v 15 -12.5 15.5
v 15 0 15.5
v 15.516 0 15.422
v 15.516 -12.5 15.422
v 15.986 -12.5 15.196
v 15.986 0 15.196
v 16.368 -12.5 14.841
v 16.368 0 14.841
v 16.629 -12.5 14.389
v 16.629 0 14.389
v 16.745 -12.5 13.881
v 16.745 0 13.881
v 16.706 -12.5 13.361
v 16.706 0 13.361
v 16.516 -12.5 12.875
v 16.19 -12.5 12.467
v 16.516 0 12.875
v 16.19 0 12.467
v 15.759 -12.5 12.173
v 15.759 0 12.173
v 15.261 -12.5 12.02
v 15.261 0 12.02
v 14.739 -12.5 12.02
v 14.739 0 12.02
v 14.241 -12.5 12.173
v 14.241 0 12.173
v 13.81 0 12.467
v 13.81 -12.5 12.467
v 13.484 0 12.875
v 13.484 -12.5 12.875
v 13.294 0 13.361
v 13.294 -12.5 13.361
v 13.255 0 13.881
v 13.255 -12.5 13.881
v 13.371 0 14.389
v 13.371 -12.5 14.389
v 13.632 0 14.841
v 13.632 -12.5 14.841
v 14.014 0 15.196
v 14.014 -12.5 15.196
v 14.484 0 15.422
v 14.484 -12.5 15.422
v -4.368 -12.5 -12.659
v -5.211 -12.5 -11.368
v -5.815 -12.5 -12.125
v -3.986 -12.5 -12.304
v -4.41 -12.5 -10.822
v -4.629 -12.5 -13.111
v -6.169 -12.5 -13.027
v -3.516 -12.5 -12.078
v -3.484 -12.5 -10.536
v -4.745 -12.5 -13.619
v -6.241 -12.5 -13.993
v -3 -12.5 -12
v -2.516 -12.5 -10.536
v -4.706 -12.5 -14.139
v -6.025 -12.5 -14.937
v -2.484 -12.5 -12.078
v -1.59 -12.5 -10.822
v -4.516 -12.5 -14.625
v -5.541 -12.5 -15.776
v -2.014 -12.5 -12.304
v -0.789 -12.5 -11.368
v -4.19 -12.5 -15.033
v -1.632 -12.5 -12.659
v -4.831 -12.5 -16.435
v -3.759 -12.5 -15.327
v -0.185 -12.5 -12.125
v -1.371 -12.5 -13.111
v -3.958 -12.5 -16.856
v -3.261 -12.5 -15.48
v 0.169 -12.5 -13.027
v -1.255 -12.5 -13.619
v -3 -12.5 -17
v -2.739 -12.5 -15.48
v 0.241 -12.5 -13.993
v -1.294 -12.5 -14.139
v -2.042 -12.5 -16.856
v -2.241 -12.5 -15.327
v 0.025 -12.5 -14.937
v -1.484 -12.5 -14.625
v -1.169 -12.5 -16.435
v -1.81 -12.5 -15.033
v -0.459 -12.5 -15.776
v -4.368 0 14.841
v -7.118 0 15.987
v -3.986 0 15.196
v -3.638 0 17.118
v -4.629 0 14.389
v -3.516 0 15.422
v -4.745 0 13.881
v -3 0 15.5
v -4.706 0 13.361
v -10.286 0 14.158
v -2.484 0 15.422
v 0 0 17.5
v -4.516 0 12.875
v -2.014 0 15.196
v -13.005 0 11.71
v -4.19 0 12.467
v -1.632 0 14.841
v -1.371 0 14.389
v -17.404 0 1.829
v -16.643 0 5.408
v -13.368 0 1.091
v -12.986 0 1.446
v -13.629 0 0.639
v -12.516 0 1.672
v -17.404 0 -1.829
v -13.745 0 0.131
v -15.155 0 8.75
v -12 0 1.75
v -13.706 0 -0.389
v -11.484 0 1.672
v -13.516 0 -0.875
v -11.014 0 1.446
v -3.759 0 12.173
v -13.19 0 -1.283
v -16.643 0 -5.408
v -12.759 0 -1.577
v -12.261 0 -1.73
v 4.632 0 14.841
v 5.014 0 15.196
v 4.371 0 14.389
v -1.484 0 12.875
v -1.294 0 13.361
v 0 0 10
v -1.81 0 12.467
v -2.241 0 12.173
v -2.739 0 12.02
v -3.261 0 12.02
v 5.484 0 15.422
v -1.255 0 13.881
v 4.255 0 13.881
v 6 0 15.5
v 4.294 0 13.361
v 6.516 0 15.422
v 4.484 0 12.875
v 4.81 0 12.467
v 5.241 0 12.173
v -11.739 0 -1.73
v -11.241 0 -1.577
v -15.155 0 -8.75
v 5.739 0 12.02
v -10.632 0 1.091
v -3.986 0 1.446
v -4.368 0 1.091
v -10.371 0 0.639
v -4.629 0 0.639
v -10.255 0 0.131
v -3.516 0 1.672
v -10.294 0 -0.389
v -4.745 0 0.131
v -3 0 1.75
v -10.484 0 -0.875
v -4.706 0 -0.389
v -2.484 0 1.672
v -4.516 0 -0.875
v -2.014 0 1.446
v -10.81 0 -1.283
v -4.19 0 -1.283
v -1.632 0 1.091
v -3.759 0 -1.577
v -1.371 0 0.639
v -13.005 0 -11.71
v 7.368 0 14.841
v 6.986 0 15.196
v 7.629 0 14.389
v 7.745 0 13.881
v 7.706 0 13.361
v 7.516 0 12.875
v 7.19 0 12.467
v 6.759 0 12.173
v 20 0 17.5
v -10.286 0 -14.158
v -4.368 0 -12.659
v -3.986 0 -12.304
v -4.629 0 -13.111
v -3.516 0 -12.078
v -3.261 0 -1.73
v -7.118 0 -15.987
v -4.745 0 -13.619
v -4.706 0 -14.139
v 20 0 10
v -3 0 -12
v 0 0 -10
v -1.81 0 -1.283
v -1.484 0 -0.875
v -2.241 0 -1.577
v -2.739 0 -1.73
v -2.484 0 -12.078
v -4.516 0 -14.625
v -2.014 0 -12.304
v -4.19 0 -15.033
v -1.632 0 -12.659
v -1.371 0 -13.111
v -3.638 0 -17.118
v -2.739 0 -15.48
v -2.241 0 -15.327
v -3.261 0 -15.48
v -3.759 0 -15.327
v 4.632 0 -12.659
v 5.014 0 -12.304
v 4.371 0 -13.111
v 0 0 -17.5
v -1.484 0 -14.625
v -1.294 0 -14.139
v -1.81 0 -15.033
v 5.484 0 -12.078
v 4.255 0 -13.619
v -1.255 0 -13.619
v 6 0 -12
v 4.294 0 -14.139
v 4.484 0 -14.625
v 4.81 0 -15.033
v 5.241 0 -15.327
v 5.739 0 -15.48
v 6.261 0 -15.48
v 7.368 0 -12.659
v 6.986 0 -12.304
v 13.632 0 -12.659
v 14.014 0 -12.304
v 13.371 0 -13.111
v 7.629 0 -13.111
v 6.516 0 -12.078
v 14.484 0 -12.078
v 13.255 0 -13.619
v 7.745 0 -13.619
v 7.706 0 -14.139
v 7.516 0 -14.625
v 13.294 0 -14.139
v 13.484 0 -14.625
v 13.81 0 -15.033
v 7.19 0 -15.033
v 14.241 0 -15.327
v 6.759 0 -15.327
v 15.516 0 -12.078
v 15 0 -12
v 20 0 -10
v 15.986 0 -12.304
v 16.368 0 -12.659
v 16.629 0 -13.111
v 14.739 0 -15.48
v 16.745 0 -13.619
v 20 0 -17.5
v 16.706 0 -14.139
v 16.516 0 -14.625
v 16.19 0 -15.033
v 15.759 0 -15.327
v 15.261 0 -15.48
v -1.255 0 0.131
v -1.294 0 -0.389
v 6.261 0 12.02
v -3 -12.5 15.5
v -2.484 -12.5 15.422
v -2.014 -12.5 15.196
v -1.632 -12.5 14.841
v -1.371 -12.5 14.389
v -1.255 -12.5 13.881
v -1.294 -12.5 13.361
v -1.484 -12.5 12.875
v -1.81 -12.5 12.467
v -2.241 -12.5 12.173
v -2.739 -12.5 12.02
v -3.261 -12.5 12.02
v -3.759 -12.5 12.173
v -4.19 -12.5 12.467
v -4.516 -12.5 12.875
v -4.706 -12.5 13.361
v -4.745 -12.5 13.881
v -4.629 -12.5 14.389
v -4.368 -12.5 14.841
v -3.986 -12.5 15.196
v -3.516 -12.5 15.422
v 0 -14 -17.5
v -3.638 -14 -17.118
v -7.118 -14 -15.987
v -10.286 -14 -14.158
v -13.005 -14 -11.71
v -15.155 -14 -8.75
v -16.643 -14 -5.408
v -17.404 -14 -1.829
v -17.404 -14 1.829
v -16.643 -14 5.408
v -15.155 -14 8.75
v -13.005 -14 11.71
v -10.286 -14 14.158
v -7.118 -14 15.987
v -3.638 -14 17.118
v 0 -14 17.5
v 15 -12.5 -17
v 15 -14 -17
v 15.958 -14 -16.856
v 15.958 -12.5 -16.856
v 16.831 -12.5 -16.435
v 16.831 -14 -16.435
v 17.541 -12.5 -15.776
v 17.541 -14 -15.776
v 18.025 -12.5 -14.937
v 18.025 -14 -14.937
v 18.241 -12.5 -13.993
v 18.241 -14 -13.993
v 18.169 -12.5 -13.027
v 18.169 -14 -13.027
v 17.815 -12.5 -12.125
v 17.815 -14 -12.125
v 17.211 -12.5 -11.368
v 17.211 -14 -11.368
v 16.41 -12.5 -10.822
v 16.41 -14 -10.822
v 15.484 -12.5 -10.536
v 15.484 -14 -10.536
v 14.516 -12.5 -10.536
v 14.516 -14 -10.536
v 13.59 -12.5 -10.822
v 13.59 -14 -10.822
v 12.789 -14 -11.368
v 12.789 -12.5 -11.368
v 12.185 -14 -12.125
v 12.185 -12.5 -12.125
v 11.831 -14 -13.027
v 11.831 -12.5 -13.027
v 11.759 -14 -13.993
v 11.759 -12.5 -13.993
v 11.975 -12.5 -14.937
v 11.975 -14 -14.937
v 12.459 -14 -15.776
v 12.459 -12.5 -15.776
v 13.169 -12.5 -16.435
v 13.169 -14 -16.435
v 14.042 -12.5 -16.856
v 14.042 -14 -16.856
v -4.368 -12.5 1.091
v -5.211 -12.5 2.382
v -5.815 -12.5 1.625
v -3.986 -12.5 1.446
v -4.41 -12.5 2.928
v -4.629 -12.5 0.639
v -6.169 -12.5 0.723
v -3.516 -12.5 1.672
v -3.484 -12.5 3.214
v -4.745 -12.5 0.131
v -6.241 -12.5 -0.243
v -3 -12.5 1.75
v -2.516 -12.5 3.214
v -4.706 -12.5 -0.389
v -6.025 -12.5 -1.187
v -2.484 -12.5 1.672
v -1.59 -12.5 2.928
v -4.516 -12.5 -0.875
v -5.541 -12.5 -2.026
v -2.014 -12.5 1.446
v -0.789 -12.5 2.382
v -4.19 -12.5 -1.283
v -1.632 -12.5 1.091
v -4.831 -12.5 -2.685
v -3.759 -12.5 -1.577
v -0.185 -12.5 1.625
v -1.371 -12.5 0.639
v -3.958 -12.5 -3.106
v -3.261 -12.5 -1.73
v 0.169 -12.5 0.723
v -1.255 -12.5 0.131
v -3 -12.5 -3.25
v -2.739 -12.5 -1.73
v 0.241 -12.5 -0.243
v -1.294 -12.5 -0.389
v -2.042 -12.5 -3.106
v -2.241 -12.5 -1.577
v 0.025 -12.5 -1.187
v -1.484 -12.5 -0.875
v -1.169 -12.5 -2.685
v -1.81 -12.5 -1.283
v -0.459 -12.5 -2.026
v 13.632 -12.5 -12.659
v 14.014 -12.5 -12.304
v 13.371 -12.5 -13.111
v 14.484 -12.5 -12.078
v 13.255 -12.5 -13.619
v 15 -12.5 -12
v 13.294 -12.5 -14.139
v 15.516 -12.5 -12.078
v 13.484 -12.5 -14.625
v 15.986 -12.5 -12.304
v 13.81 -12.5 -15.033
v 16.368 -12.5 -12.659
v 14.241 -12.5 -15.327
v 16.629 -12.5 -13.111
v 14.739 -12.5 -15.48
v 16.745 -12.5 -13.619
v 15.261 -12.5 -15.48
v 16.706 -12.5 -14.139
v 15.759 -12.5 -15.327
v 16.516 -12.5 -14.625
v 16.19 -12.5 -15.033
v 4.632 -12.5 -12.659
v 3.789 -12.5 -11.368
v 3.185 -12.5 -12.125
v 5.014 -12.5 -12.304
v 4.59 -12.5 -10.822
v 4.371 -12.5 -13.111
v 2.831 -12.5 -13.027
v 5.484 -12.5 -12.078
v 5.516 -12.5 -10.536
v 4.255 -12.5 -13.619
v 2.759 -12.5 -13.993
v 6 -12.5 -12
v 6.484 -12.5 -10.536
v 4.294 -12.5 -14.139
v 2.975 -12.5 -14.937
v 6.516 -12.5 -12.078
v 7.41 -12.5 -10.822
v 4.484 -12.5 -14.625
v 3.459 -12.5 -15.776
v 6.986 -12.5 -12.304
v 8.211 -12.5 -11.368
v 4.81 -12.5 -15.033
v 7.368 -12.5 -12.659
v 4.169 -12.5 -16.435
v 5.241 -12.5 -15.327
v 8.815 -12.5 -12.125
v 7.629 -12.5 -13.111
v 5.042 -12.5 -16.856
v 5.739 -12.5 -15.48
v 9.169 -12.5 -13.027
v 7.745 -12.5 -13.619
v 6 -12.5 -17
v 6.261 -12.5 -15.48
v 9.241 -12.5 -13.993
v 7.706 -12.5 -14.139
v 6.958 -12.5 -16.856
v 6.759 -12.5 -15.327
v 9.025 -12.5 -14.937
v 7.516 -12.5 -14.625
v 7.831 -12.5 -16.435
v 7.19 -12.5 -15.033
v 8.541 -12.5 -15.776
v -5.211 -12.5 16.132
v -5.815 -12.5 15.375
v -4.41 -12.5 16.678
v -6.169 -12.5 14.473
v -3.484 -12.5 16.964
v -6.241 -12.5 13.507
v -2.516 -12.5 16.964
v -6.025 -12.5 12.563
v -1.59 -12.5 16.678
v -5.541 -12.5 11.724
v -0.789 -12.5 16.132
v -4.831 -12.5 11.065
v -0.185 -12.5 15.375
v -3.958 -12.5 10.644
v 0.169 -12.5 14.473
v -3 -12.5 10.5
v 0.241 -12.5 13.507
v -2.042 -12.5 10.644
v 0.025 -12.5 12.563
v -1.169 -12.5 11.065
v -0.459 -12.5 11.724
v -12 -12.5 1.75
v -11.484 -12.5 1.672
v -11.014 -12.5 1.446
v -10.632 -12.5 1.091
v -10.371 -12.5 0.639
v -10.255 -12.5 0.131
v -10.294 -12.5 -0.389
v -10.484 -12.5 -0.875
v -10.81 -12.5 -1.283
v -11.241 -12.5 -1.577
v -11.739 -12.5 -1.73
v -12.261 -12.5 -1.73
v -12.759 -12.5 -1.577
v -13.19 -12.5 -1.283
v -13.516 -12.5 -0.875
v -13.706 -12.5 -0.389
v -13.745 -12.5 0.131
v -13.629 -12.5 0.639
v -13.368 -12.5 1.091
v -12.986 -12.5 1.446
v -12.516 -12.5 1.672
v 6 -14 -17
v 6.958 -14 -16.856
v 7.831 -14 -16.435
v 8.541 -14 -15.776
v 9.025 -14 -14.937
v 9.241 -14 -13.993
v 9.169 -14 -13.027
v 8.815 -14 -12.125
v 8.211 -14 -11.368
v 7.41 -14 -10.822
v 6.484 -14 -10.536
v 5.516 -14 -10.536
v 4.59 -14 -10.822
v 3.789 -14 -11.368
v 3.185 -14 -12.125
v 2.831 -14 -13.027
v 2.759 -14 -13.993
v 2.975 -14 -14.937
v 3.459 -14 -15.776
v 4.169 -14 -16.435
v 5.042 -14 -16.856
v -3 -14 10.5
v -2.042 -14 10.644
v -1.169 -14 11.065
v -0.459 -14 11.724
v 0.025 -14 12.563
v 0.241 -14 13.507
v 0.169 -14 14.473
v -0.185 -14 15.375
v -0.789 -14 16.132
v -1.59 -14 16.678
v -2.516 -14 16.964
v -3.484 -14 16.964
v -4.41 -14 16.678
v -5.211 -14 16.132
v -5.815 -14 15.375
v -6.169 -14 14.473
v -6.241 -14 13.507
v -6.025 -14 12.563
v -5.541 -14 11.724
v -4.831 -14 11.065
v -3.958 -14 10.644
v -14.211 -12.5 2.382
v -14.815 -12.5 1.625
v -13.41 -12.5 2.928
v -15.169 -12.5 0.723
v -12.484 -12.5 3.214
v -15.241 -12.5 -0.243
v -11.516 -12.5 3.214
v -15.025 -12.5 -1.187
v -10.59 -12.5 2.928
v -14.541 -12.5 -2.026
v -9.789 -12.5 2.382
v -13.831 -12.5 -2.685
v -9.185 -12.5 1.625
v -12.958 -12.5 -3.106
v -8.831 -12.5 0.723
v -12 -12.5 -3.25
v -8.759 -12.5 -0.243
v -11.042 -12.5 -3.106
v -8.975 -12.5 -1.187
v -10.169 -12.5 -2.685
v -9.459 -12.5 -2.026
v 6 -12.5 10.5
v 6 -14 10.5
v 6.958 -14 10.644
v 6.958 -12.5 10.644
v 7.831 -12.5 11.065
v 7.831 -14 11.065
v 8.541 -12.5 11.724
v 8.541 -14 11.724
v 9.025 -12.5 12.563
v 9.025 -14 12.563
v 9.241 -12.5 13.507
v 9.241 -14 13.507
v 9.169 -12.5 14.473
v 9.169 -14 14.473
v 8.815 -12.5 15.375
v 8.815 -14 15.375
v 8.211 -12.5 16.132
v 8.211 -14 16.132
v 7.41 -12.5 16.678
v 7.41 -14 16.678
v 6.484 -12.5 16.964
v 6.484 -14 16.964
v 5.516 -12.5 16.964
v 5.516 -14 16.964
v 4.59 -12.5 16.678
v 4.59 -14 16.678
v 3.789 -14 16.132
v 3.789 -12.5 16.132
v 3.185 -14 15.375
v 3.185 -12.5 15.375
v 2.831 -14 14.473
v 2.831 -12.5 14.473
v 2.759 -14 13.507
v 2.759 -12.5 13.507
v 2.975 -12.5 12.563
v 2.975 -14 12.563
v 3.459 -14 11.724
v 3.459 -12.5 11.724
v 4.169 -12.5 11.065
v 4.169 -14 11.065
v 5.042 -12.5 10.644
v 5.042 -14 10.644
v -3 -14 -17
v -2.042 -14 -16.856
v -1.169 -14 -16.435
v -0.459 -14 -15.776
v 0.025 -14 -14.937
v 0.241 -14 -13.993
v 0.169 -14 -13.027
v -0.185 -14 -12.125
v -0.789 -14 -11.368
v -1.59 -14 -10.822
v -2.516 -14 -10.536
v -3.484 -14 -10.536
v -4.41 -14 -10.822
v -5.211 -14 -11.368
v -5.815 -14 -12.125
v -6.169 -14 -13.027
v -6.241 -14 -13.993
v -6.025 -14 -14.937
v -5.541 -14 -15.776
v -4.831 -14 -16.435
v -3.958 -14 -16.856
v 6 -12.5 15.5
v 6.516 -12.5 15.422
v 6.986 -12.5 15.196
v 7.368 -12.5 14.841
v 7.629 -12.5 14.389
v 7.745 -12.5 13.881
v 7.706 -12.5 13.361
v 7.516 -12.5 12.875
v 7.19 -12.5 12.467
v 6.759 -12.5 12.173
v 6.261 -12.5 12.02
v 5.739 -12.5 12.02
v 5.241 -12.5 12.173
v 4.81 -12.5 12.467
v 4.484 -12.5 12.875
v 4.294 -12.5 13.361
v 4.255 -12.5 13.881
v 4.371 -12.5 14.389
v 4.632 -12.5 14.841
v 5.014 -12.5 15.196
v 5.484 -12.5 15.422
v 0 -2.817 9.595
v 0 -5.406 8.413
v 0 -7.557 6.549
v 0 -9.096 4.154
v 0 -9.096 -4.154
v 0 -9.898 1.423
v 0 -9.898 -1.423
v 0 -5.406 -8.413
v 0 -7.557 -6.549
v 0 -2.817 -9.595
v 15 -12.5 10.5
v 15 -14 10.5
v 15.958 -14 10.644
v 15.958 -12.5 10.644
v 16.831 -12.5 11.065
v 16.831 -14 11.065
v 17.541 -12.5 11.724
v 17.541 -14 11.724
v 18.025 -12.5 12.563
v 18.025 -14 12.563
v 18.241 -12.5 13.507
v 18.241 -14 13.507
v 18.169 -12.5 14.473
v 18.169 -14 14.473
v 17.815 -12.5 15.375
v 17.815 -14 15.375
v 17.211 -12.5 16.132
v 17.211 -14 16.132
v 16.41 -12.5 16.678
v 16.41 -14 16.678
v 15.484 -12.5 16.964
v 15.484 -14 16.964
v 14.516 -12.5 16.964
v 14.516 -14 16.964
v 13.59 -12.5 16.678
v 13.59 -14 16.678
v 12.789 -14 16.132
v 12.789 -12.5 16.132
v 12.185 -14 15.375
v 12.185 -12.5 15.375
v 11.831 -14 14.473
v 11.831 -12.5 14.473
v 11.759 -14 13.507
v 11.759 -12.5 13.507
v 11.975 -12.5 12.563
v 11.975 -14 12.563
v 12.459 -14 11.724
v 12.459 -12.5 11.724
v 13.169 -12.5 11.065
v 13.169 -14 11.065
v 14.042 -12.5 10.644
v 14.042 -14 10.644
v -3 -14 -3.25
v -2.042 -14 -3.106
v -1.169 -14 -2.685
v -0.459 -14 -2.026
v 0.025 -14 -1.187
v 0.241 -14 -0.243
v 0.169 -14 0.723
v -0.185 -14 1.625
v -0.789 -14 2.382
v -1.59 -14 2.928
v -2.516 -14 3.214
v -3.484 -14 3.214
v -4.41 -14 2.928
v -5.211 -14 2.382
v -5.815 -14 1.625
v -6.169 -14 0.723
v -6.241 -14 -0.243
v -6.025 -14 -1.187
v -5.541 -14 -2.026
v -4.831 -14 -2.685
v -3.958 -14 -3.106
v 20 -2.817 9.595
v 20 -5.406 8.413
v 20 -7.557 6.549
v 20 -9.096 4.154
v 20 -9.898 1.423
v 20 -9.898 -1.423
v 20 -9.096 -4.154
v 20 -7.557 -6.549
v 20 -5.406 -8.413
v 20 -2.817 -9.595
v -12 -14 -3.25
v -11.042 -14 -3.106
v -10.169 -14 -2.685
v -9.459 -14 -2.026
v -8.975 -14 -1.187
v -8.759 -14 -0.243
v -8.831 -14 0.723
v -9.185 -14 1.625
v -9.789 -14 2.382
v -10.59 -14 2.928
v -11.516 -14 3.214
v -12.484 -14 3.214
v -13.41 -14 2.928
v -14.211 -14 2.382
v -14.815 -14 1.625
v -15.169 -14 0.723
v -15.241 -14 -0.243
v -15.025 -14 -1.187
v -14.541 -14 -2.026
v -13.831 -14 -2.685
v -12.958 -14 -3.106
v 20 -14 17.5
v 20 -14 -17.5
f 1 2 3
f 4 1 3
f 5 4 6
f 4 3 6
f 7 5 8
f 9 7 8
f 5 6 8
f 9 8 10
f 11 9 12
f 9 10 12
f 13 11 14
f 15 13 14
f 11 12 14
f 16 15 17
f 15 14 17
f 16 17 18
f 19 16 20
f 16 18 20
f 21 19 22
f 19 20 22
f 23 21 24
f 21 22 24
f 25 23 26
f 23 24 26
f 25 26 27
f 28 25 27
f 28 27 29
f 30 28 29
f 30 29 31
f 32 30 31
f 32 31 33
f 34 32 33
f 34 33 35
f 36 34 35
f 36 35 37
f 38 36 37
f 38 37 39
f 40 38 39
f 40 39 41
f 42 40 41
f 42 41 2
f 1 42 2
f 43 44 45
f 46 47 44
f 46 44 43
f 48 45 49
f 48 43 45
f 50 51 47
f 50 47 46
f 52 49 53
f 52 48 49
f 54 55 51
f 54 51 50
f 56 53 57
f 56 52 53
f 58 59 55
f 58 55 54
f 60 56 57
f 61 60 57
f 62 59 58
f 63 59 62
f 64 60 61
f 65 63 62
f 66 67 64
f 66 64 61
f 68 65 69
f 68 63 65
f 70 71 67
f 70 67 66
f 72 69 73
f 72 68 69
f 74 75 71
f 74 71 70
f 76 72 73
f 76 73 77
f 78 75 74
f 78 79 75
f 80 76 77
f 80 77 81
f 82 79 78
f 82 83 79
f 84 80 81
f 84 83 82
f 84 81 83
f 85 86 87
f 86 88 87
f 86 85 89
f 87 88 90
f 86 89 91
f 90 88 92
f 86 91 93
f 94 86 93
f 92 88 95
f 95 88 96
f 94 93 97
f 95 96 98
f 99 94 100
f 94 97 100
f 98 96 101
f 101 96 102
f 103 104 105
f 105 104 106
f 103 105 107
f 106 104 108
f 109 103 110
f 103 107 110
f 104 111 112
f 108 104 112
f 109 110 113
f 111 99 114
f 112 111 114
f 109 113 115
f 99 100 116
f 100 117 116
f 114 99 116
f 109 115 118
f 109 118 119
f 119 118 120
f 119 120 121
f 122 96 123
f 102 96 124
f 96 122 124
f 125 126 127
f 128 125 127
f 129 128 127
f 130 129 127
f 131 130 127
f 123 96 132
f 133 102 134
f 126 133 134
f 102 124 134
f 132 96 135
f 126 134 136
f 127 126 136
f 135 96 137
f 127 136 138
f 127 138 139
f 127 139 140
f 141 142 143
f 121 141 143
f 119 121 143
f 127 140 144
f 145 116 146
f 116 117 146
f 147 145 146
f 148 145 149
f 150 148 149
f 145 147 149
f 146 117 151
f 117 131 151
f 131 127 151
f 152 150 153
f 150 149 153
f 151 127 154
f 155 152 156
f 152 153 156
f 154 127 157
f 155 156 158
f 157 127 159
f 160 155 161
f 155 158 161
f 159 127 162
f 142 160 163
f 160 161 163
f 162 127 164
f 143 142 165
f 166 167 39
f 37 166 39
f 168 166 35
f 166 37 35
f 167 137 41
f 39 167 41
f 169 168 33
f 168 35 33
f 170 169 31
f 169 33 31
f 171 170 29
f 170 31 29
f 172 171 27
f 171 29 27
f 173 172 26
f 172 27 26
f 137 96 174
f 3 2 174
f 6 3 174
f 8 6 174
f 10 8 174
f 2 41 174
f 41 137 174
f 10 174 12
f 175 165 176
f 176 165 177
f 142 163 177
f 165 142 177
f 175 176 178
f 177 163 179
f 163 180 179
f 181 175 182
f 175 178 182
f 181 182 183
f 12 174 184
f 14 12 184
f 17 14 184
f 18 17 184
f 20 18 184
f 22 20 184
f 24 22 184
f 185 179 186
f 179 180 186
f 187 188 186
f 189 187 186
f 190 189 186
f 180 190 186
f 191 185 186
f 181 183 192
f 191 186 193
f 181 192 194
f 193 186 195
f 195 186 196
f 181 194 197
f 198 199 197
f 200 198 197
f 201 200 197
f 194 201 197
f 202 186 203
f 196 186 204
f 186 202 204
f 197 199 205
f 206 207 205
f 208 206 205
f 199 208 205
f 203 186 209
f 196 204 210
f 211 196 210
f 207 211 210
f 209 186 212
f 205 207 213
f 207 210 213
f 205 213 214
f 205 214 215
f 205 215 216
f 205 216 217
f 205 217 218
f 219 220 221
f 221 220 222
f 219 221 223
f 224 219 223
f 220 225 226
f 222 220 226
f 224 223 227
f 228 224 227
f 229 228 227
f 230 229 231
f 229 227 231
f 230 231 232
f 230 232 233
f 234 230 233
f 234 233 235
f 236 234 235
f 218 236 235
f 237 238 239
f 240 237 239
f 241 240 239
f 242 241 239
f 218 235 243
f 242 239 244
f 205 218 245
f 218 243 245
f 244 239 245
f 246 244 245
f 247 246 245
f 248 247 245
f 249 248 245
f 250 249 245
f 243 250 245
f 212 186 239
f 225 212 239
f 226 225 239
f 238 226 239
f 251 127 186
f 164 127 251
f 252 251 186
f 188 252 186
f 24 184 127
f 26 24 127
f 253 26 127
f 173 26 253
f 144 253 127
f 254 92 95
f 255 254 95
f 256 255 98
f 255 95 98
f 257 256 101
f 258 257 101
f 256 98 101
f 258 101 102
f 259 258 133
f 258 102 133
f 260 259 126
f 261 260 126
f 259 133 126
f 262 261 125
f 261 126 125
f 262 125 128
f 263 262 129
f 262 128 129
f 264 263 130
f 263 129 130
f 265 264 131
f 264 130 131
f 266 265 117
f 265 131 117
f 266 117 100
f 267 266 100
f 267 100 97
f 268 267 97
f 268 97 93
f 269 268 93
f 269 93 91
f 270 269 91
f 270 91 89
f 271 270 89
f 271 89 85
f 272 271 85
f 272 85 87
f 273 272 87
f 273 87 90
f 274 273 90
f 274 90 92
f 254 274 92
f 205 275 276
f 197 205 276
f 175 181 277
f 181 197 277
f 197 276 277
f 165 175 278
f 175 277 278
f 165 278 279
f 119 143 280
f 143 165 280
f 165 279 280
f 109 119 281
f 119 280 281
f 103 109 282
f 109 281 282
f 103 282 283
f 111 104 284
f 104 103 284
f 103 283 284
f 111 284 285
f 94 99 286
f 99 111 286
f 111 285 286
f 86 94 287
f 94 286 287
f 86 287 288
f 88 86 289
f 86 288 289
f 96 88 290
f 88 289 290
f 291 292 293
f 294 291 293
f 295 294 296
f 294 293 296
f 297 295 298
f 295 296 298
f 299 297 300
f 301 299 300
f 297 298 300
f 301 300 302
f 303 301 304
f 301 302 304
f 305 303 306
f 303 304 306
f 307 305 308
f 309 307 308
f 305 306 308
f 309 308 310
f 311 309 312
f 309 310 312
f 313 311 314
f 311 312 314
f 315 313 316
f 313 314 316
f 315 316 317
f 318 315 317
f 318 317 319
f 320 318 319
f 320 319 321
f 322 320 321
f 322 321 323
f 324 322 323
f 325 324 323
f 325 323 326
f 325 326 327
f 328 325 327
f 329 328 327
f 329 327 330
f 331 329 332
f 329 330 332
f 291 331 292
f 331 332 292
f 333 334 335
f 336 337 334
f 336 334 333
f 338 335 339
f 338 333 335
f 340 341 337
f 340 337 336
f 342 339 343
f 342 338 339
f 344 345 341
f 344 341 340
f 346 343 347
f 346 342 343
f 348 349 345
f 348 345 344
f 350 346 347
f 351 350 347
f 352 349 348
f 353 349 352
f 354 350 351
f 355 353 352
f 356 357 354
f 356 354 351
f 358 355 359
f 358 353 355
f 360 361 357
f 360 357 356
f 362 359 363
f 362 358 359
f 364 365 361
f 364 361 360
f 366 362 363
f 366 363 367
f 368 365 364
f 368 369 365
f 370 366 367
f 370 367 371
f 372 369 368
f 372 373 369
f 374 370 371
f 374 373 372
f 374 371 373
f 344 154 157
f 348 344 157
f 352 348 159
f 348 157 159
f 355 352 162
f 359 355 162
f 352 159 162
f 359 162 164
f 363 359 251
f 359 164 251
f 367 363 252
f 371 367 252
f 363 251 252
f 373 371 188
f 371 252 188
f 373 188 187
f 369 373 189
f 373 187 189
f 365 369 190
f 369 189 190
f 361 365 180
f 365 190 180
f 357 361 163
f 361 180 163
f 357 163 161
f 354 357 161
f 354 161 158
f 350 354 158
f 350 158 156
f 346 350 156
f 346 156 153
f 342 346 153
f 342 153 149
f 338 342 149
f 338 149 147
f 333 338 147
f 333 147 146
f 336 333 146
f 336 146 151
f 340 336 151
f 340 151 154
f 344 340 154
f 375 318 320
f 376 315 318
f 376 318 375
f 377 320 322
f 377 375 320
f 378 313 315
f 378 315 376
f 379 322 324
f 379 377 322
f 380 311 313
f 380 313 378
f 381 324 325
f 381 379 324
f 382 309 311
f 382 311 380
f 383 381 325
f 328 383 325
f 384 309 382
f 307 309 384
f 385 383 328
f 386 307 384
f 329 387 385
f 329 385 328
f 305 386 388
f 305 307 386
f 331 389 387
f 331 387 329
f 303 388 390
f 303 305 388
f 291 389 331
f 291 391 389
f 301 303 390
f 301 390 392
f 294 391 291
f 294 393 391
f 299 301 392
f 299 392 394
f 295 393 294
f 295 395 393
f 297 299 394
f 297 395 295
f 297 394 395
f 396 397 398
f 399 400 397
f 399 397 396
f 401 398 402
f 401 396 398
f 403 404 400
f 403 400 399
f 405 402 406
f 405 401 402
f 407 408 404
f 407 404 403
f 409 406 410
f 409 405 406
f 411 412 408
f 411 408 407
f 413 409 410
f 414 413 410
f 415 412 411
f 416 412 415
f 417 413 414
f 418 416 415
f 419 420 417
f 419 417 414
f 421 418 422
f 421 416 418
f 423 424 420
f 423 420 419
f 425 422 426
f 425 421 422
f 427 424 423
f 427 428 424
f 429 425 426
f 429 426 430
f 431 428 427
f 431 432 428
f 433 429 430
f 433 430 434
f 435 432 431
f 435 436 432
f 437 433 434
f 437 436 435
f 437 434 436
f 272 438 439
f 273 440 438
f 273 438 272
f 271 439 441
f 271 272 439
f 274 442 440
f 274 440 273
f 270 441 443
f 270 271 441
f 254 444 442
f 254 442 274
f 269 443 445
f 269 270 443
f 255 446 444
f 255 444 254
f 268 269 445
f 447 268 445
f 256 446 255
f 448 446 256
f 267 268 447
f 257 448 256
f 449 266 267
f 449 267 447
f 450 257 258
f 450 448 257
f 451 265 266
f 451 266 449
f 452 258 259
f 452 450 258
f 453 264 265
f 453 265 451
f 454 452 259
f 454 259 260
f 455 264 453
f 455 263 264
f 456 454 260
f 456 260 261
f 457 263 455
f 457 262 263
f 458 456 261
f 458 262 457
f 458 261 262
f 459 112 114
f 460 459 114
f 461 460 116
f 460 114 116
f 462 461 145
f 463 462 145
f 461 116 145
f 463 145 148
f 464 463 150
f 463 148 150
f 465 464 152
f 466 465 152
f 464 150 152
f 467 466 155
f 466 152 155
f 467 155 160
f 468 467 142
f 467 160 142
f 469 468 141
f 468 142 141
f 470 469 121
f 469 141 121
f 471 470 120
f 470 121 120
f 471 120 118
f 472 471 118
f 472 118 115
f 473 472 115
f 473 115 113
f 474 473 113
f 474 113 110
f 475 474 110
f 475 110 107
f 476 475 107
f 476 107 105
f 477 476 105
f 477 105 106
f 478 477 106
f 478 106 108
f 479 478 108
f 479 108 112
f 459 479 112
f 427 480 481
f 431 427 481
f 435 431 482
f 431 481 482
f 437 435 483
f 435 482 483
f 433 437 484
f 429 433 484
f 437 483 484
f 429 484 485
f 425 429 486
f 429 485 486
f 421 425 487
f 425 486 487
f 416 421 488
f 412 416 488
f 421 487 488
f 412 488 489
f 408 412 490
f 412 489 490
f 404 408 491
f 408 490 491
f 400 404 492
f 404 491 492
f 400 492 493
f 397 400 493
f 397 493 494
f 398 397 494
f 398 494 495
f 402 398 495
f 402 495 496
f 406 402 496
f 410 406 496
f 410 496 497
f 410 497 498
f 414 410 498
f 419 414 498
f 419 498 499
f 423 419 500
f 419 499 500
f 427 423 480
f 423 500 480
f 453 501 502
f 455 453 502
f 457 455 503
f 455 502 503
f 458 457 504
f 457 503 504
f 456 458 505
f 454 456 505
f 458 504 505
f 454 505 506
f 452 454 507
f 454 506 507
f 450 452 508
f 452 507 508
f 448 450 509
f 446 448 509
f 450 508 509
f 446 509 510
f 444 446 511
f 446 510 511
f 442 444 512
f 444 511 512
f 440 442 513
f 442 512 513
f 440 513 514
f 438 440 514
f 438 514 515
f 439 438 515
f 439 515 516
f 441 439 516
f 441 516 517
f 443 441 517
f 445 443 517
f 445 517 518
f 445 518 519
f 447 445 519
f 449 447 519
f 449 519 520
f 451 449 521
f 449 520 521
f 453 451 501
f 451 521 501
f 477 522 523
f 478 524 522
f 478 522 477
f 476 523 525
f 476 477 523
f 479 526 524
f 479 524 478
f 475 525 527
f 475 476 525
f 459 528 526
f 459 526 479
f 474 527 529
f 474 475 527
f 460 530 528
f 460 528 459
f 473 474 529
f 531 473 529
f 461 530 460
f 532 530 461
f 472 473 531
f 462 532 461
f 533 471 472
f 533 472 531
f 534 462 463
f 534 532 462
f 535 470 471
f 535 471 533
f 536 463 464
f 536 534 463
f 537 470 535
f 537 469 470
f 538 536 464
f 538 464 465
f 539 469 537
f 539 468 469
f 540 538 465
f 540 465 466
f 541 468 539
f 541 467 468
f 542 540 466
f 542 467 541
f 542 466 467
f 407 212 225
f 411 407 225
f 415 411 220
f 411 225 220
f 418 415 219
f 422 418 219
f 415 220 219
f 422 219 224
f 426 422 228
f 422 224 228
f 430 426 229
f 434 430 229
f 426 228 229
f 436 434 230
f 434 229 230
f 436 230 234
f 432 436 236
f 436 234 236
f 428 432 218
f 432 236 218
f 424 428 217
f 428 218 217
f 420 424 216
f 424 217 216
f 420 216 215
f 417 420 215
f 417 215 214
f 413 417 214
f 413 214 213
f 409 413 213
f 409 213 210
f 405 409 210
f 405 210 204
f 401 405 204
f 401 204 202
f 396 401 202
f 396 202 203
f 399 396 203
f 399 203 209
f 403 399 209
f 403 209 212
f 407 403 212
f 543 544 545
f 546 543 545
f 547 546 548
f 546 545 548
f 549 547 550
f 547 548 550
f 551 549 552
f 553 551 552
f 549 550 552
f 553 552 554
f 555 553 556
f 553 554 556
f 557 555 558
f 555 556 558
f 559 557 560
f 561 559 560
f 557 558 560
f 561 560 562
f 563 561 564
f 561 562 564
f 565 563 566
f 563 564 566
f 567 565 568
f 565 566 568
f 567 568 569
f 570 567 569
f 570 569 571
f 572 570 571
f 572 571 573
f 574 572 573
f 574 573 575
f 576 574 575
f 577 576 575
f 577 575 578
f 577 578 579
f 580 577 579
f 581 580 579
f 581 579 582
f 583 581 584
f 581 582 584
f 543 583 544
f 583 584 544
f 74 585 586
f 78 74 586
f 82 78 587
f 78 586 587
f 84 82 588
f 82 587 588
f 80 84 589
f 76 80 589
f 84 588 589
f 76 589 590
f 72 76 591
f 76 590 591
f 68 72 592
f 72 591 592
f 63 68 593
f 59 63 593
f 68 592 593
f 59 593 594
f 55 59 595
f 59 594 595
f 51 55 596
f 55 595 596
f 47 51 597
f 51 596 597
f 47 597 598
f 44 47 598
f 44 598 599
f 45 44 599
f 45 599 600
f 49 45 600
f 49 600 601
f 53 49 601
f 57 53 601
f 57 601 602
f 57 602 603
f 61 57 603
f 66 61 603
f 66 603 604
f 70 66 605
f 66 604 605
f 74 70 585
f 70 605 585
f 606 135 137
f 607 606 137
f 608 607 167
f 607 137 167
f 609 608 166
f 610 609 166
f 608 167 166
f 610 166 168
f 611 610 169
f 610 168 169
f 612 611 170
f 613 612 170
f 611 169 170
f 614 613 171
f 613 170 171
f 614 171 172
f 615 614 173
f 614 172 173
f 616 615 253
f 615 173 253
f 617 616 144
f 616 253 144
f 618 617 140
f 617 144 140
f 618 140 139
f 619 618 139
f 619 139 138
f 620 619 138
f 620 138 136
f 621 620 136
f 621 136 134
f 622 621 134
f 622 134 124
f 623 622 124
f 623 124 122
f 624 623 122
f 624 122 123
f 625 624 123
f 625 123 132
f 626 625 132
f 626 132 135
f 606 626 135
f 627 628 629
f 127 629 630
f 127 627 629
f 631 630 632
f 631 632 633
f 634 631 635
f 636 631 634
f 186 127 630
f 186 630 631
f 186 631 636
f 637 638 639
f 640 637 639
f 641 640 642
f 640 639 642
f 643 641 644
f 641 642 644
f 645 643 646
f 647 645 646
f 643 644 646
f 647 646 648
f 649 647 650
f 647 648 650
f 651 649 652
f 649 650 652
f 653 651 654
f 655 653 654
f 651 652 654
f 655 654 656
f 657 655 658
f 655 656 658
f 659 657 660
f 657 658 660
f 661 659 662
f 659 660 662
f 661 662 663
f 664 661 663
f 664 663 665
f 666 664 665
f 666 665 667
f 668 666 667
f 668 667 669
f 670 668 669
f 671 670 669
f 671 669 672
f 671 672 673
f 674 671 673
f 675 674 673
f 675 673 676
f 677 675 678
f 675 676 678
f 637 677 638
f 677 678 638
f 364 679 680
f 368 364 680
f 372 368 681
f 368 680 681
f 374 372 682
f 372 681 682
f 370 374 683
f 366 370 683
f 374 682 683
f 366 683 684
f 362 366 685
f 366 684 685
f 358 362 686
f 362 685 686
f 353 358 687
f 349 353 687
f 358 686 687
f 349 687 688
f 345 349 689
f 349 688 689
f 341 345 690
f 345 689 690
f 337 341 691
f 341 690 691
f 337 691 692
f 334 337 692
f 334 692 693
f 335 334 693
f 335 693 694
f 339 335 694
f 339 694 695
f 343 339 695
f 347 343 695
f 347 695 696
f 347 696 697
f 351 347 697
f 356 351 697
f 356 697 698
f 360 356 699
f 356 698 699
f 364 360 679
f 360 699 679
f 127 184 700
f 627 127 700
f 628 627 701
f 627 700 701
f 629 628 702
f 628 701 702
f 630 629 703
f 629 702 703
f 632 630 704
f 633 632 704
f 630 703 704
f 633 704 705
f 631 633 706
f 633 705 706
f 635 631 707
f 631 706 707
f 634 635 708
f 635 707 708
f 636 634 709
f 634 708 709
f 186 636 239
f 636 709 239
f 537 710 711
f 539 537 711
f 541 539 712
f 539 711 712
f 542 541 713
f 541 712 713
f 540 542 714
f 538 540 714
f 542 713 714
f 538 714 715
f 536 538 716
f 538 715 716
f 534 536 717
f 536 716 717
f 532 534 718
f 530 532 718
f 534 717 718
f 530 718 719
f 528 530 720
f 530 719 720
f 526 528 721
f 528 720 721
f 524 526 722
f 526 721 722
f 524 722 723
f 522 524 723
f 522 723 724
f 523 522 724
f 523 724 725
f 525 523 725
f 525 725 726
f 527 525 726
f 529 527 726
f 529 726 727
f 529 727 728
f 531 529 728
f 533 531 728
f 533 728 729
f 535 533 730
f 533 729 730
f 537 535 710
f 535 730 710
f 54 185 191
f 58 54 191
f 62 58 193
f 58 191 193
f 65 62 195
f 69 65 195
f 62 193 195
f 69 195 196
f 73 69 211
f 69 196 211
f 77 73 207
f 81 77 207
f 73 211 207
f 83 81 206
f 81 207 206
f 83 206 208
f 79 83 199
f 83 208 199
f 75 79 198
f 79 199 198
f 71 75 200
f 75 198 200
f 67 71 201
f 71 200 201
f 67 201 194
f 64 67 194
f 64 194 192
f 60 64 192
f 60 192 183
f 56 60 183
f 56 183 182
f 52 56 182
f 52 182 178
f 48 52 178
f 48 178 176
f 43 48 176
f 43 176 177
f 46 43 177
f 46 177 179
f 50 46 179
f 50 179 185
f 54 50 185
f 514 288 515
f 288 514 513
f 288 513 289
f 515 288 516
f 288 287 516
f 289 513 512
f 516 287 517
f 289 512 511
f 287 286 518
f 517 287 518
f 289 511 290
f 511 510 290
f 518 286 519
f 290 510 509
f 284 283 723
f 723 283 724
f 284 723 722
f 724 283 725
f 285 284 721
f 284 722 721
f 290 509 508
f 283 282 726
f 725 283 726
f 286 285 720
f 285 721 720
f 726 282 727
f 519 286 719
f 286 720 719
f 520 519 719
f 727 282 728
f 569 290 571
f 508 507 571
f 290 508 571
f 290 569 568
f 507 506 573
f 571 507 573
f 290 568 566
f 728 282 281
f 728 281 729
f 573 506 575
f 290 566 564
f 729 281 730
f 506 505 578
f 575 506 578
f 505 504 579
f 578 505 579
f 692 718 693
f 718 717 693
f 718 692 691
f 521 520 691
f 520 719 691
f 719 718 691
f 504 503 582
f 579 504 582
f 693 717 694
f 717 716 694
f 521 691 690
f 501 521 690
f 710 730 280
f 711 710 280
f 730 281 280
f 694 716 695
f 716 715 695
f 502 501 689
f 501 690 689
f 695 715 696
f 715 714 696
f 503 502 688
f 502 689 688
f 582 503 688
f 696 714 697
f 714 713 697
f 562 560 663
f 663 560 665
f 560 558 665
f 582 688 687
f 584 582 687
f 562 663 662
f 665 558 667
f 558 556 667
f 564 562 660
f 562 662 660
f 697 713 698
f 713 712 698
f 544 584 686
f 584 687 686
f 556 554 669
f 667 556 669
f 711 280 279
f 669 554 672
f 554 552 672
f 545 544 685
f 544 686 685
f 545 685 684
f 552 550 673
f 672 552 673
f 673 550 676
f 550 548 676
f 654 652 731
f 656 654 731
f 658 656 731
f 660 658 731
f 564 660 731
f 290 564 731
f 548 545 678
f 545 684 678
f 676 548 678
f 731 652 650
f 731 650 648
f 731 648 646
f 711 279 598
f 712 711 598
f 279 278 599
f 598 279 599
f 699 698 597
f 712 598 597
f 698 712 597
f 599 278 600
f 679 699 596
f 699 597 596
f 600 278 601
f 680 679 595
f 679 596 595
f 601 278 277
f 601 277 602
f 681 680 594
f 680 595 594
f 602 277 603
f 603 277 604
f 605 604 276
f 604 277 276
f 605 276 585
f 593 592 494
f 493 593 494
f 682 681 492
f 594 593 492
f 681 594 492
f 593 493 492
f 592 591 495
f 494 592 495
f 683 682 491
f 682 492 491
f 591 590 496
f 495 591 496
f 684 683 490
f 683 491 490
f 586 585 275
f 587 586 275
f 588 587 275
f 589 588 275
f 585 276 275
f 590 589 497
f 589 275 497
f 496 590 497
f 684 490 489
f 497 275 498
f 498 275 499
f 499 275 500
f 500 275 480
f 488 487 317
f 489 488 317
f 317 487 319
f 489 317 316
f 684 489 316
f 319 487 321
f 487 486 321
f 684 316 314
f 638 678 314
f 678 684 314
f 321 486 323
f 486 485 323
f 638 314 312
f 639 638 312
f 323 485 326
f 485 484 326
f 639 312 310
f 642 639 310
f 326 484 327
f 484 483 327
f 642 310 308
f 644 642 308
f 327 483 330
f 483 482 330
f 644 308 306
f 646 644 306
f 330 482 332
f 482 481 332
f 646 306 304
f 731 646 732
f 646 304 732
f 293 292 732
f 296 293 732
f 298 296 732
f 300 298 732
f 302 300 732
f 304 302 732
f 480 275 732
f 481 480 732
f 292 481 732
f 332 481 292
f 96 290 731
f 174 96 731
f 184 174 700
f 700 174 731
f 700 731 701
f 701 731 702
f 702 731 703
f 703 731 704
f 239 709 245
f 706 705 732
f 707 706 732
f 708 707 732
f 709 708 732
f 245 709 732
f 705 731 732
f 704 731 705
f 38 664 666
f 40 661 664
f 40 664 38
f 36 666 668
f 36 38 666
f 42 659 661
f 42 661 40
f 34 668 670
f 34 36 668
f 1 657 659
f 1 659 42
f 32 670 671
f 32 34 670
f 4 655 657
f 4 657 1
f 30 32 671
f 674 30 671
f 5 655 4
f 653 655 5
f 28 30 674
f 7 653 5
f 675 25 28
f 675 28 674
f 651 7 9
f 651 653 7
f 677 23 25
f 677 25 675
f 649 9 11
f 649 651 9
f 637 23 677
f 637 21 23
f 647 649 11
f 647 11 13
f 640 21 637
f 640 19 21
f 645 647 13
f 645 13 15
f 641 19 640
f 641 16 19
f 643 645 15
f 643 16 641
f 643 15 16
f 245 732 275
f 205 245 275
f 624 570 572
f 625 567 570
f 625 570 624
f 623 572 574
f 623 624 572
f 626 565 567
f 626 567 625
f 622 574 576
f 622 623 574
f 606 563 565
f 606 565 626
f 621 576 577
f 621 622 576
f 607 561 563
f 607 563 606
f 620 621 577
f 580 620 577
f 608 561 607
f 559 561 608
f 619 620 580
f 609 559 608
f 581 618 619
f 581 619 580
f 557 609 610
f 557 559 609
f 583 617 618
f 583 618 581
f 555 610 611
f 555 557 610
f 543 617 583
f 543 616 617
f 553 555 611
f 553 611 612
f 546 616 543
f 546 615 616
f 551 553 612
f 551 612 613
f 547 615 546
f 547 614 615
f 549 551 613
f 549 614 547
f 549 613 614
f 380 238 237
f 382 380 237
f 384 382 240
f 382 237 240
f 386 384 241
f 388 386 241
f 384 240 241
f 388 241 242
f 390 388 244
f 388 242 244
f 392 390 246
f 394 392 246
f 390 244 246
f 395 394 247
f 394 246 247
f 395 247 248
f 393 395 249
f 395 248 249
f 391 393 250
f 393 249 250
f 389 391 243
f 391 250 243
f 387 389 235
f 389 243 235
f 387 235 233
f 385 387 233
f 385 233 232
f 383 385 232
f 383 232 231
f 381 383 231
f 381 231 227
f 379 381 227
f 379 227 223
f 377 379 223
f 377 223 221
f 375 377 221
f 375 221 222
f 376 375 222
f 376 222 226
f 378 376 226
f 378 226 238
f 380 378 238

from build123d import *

# Parameters (mm, degrees)
BOSS_EXTRUDE1_DEPTH      = 14
BOSS_EXTRUDE1_DEPTH_BACK = 14
SKETCH3_R                = 10
CUT_EXTRUDE1_DEPTH       = 20
CUT_EXTRUDE3_DEPTH       = 39
SKETCH5_R                = 1.75
CUT_EXTRUDE4_DEPTH       = 39
SKETCH6_R                = 3.25
CUT_EXTRUDE5_DEPTH       = 1.5


with BuildPart() as part:
    # Sketch1 → Boss-Extrude1 (new, two sides: drawn at the far end of the back side and taken through both)
    with BuildSketch(Plane(origin=(0, 0, 0), x_dir=(1, 0, 0), z_dir=(0, 1, 0)).offset(-BOSS_EXTRUDE1_DEPTH_BACK)):
        with BuildLine():
            Line((20, 17.5), (0, 17.5))
            ThreePointArc((0, 17.5), (-17.5, -1.3e-08), (2.7e-08, -17.5))
            Line((2.7e-08, -17.5), (20, -17.5))
            Line((20, -17.5), (20, 17.5))
        make_face()
    extrude(amount=BOSS_EXTRUDE1_DEPTH + BOSS_EXTRUDE1_DEPTH_BACK)

    # Sketch3 → Cut-Extrude1 (cut)
    with BuildSketch(Plane(origin=(20, 0, 0), x_dir=(0, 0, -1), z_dir=(1, 0, 0))):
        Circle(SKETCH3_R)
    extrude(amount=-CUT_EXTRUDE1_DEPTH, mode=Mode.SUBTRACT)

    # Sketch4 → Cut-Extrude3 (cut)
    with BuildSketch(Plane(origin=(20, 0, 0), x_dir=(0, 0, -1), z_dir=(1, 0, 0))):
        Polygon((-29.488337181, 0), (29.963955523, 0), (3.938373511, 60.173176489), align=None)
    extrude(amount=-CUT_EXTRUDE3_DEPTH, mode=Mode.SUBTRACT)

    # Sketch5 → Cut-Extrude4 (cut)
    with BuildSketch(Plane(origin=(0, 0, 0), x_dir=(1, 0, 0), z_dir=(0, 1, 0))):
        with Locations((15, 13.75)):
            Circle(SKETCH5_R)
        with Locations((6, 13.75)):
            Circle(SKETCH5_R)
        with Locations((-3, 13.75)):
            Circle(SKETCH5_R)
        with Locations((-3, 0)):
            Circle(SKETCH5_R)
        with Locations((-12, 0)):
            Circle(SKETCH5_R)
        with Locations((15, -13.75)):
            Circle(SKETCH5_R)
        with Locations((6, -13.75)):
            Circle(SKETCH5_R)
        with Locations((-3, -13.75)):
            Circle(SKETCH5_R)
    extrude(amount=-CUT_EXTRUDE4_DEPTH, mode=Mode.SUBTRACT)

    # Sketch6 → Cut-Extrude5 (cut)
    with BuildSketch(Plane.XZ.offset(14)):
        with Locations((-3, 13.75)):
            Circle(SKETCH6_R)
        with Locations((6, 13.75)):
            Circle(SKETCH6_R)
        with Locations((15, 13.75)):
            Circle(SKETCH6_R)
        with Locations((-12, 0)):
            Circle(SKETCH6_R)
        with Locations((-3, 0)):
            Circle(SKETCH6_R)
        with Locations((-3, -13.75)):
            Circle(SKETCH6_R)
        with Locations((6, -13.75)):
            Circle(SKETCH6_R)
        with Locations((15, -13.75)):
            Circle(SKETCH6_R)
    extrude(amount=-CUT_EXTRUDE5_DEPTH, mode=Mode.SUBTRACT)


solid = part.part
